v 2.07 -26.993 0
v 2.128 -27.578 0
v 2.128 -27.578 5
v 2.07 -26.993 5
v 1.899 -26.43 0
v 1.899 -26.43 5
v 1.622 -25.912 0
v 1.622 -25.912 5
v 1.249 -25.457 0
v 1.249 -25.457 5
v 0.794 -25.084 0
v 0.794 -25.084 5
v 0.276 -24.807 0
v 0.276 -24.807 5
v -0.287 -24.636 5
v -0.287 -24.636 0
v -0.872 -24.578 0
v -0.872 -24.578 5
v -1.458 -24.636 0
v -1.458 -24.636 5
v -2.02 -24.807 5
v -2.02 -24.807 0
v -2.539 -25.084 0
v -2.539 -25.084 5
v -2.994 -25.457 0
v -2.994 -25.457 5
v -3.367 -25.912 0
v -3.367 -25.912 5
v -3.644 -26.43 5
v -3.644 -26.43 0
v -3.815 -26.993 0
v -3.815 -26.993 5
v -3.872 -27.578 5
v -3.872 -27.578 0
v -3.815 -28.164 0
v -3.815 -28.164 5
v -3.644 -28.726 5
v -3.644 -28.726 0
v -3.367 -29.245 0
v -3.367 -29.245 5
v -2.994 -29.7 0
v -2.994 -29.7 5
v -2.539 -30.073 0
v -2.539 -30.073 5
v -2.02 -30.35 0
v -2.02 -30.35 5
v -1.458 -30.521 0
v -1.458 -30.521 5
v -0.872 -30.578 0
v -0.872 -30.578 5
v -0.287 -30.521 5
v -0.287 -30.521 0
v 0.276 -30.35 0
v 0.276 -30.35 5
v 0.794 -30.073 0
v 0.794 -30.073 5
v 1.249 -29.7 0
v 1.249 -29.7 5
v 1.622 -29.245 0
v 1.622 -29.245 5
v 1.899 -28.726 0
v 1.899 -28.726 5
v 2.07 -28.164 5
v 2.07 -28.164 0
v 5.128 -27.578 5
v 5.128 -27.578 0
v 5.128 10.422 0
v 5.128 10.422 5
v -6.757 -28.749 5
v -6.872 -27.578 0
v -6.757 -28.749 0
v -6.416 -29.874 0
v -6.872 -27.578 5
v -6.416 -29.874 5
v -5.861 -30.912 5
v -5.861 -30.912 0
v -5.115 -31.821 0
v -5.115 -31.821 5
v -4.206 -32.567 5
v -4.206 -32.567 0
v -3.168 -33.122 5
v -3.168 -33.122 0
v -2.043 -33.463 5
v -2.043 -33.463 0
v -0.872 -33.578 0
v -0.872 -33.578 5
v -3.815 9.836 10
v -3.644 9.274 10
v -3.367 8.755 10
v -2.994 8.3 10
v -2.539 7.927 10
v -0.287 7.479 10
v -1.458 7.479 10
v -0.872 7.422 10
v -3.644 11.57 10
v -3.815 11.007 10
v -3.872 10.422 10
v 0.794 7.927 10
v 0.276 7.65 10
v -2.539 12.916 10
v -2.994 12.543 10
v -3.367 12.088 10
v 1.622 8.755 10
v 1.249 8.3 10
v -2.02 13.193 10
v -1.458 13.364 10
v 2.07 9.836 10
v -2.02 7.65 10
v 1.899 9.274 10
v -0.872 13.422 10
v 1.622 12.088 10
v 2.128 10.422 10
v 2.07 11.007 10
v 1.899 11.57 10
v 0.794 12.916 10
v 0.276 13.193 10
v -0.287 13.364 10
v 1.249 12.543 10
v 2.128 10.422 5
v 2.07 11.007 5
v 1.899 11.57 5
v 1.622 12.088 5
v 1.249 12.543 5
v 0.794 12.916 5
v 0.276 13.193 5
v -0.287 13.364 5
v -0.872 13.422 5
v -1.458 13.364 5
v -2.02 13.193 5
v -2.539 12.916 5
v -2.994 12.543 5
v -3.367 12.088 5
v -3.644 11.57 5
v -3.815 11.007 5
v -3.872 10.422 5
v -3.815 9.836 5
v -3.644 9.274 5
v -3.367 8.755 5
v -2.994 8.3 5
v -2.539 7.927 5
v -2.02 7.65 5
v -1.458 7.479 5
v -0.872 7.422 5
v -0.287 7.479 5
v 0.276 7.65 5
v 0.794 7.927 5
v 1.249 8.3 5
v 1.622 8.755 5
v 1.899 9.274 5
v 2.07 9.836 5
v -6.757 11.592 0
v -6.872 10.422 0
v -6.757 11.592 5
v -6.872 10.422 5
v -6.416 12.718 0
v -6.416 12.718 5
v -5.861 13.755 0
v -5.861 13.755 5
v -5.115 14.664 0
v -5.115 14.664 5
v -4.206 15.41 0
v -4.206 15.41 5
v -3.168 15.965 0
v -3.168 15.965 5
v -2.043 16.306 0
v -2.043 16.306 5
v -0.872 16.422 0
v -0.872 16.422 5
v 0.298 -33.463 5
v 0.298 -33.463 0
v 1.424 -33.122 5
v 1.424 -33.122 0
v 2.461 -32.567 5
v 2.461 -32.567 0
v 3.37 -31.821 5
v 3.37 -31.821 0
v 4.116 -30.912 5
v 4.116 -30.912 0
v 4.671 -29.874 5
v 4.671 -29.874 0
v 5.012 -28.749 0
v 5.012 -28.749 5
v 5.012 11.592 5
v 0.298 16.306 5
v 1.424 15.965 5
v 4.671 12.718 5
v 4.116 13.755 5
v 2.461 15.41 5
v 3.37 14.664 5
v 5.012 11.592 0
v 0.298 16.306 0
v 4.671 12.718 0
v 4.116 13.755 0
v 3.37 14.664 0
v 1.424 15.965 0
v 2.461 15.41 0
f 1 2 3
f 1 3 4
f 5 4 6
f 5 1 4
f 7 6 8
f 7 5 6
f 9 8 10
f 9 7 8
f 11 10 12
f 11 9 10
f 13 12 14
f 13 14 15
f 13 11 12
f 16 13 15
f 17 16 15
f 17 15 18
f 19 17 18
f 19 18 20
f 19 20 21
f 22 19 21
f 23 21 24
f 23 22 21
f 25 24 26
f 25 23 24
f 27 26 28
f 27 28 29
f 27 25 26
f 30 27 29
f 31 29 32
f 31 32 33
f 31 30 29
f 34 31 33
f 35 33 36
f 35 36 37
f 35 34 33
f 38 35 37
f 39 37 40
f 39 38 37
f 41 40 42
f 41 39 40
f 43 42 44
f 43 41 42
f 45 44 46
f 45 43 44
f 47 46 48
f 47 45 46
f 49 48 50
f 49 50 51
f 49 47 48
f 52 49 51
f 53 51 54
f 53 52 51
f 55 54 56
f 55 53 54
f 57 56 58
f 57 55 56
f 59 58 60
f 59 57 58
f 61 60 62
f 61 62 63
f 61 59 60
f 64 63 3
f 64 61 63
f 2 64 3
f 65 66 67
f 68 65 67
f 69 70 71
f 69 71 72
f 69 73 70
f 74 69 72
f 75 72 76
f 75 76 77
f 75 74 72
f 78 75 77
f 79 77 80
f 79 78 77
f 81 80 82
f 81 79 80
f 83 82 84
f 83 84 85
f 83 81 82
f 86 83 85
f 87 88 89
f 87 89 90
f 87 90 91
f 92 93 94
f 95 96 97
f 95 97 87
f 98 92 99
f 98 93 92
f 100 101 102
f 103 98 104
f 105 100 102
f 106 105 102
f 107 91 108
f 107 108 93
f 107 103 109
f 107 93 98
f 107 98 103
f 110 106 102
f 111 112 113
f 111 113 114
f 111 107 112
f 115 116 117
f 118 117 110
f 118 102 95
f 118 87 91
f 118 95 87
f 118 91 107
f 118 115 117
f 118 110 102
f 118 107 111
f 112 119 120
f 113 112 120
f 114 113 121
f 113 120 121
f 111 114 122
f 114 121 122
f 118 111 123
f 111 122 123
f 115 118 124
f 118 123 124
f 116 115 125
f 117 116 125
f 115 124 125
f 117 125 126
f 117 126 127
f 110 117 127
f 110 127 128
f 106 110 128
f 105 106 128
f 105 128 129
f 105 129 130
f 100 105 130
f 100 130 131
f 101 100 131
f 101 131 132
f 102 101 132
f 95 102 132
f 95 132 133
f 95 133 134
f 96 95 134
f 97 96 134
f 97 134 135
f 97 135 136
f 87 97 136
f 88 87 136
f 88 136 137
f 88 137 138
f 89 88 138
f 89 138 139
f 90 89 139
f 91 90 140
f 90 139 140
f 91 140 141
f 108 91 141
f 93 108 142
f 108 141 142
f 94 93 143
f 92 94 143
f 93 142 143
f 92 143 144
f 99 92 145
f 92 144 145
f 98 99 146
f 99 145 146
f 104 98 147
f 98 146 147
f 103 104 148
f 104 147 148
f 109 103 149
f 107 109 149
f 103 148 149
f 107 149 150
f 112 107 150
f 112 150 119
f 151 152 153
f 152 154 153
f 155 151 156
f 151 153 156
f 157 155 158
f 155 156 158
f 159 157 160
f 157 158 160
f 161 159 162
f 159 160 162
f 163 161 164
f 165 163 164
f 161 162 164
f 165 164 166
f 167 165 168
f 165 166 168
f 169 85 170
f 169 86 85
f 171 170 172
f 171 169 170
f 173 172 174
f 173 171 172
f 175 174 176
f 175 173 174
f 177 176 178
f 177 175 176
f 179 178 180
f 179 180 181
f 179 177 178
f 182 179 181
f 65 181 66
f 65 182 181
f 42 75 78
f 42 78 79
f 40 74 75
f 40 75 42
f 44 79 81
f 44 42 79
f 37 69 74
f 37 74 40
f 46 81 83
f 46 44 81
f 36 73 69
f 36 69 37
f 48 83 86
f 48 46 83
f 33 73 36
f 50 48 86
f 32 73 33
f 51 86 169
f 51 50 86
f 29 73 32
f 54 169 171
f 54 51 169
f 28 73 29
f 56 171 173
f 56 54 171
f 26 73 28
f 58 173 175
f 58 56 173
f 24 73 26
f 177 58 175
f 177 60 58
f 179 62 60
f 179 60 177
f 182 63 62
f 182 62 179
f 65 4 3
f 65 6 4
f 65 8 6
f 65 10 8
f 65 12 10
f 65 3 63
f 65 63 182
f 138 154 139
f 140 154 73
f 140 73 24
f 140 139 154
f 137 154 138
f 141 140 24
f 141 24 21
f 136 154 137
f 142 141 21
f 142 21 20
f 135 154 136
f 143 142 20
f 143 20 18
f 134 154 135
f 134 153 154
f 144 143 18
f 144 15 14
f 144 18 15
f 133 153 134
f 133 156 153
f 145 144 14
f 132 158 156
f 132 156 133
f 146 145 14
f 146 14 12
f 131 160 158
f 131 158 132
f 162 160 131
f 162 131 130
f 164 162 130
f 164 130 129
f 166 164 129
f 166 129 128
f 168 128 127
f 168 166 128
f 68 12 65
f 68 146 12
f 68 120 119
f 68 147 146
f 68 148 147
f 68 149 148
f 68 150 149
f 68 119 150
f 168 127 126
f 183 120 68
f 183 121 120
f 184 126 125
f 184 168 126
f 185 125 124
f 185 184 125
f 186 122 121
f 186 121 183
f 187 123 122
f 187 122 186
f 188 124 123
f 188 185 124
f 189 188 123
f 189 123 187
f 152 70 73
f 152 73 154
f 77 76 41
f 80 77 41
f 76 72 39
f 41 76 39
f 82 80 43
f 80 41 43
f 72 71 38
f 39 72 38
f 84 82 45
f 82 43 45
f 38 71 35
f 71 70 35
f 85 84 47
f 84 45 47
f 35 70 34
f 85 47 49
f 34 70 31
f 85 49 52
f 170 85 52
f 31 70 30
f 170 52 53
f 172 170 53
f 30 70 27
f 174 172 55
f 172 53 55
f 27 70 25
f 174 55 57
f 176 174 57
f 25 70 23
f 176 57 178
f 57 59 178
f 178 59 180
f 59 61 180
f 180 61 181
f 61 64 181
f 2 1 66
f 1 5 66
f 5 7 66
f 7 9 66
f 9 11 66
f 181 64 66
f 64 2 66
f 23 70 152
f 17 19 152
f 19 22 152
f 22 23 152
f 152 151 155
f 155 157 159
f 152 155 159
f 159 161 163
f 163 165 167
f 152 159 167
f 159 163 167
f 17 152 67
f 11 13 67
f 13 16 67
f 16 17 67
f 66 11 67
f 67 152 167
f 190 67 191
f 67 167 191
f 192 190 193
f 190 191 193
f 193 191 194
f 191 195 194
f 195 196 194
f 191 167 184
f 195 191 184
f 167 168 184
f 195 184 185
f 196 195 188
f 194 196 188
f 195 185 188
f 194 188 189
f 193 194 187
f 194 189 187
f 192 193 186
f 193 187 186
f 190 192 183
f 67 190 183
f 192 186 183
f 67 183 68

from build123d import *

# Parameters (mm, degrees)
F0_W     = 12
F0_H     = 50
F0_R     = 3
F1_DEPTH = 5
F2_R     = 5.99999
F3_DEPTH = 10


# Not quite as in the source:
# - a fillet or chamfer is up to 0.001 mm smaller than in the source, because OpenCascade refuses the exact size


with BuildPart() as f1:
    # F0 (on Top) → F1 (new body)
    with BuildSketch(Plane.XY):
        with Locations((-0.8723753854, -8.5783358663)):
            Rectangle(F0_W, F0_H)
        with Locations((-0.8723753854, -27.5783358663)):
            Circle(F0_R, mode=Mode.SUBTRACT)
        with Locations((-0.8723753854, 10.4216641337)):
            Circle(F0_R, mode=Mode.SUBTRACT)
    extrude(amount=F1_DEPTH)

    # F2 (radius 6 in the source; OpenCascade refuses exactly that, so slightly less here)
    f2_edges = [f1.edges().sort_by_distance(p)[0] for p in [
        (-6.872375, 16.421664, 2.5),
        (5.127625, 16.421664, 2.5),
        (5.127625, -33.578336, 2.5),
        (-6.872375, -33.578336, 2.5),
    ]]
    fillet(f2_edges, radius=F2_R)

    # F0 (on Top) → F3 (join)
    with BuildSketch(Plane.XY):
        with Locations((-0.8723753854, 10.4216641337)):
            Circle(F0_R)
    extrude(amount=F3_DEPTH)


solid = f1.part
